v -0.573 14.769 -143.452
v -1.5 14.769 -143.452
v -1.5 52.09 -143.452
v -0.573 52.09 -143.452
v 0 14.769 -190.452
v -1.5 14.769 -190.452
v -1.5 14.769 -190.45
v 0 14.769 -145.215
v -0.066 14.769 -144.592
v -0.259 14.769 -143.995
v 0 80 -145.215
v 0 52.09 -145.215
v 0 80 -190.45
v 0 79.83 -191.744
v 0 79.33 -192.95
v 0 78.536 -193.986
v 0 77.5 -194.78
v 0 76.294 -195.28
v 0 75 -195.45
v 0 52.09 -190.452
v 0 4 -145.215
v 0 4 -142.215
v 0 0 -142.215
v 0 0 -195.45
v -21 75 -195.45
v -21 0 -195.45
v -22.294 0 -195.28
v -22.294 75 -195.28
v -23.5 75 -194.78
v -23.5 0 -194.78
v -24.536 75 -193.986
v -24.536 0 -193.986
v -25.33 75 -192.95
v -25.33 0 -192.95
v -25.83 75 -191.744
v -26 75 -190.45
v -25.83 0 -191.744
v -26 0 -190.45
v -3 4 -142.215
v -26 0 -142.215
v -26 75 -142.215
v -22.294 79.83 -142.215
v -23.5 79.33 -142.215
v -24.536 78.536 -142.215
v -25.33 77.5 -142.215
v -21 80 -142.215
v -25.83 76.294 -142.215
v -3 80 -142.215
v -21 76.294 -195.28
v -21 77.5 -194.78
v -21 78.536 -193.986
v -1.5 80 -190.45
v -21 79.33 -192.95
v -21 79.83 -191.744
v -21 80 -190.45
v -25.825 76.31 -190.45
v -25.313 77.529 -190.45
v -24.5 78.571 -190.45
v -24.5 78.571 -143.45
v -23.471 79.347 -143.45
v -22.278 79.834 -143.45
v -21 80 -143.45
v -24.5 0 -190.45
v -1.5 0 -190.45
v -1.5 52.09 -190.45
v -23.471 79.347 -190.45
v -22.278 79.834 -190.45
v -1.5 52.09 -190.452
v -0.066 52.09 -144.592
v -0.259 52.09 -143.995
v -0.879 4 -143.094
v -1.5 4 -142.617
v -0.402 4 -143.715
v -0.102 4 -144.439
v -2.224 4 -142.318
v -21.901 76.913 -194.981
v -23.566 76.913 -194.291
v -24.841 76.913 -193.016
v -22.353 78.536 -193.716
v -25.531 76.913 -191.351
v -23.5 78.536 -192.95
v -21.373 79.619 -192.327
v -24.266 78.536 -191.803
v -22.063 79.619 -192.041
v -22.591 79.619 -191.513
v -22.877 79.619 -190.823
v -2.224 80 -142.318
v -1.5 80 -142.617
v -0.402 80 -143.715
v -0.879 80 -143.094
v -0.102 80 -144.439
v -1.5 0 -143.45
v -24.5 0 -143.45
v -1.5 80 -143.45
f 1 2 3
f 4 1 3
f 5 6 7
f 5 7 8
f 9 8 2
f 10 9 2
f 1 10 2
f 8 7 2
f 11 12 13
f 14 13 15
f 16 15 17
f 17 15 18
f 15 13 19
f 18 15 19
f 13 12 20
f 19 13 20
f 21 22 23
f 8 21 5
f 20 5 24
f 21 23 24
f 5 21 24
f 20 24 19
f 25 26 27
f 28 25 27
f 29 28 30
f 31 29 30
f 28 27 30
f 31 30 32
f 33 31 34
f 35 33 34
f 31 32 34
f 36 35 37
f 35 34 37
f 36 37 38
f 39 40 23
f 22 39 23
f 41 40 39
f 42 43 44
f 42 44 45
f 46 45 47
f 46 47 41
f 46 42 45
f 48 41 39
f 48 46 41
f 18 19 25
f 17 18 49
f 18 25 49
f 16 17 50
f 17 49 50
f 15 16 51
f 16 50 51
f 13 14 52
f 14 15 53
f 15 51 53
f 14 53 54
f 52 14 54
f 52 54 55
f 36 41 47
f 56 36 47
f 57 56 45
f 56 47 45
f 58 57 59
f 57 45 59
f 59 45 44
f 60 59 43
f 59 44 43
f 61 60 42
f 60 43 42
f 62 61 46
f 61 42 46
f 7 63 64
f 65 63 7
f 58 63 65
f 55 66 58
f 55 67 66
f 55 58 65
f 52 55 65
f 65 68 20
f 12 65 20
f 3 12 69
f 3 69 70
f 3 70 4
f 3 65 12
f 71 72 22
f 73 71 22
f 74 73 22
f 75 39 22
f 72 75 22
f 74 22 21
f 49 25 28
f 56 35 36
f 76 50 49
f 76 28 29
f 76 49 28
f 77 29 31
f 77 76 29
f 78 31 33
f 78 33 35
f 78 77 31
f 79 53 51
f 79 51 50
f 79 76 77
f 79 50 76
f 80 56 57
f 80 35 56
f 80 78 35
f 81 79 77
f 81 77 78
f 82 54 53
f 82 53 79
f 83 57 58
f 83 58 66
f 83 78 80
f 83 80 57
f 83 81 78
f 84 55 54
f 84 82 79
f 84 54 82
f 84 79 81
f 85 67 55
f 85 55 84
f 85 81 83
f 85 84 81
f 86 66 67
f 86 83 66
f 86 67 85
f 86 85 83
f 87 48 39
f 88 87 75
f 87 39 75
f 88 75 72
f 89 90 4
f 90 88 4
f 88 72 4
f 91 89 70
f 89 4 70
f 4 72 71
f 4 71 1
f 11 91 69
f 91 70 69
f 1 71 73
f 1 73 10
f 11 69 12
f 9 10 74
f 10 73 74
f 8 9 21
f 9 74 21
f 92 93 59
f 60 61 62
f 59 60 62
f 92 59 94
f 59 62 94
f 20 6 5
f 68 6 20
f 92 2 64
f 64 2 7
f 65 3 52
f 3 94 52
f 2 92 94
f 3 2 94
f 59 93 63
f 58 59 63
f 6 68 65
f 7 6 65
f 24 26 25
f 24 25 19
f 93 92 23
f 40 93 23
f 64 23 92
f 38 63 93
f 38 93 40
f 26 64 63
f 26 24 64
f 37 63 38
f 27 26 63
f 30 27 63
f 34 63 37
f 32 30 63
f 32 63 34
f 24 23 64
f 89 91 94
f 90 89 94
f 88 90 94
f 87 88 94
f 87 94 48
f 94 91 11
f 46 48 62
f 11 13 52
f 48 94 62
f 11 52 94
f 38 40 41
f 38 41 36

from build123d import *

# Parameters (mm, degrees)
BOSS_EXTRUDE1_DEPTH = 4
BOSS_EXTRUDE2_DEPTH = 80
SKETCH3_R           = 8.5
CUT_EXTRUDE1_DEPTH  = 171
SKETCH4_W           = 68
SKETCH4_H           = 18.002499925
CUT_EXTRUDE2_DEPTH  = 116
SKETCH5_W           = 23
SKETCH5_H           = 47
CUT_EXTRUDE3_DEPTH  = 110.266506281
SKETCH8_W           = 47
SKETCH8_H           = 37.321718457
CUT_EXTRUDE6_DEPTH  = 3.266506281
FILLET2_R           = 5
FILLET3_R           = 5
FILLET4_R           = 5
SKETCH9_W           = 106
SKETCH9_H           = 50.845410363
CUT_EXTRUDE7_DEPTH  = 92
FILLET16_R          = 10
FILLET18_R          = 3
CUT_EXTRUDE9_DEPTH  = 90


with BuildPart() as part:
    # Sketch1 → Boss-Extrude1 (new body)
    with BuildSketch(Plane(origin=(0, 0, 0), x_dir=(1, 0, 0), z_dir=(0, 1, 0))):
        Polygon((0, 152), (0, 101.37), (75, 101.37), (75, 191.351980657), (75, 192.37), (0, 192.37), align=None)
    extrude(amount=BOSS_EXTRUDE1_DEPTH)

    # Sketch2 → Boss-Extrude2 (add)
    with BuildSketch(Plane(origin=(0, 0, 0), x_dir=(-1, 0, 0), z_dir=(0, -1, 0))):
        Polygon((26, 91.37), (26, 176.99818396), (26, 195.45), (-80, 195.45), (-80, 176.99818396), (-80, 91.37), align=None)
        Polygon((-75, 192), (-75, 192.37), (0, 192.37), (0, 101.37), (-75, 101.37), align=None, mode=Mode.SUBTRACT)
    extrude(amount=-BOSS_EXTRUDE2_DEPTH)

    # Sketch3 → Cut-Extrude1 (cut)
    with BuildSketch(Plane.XY.offset(18)):
        with Locations((34.765402097, 21.5)):
            Circle(SKETCH3_R)
    extrude(amount=-CUT_EXTRUDE1_DEPTH, mode=Mode.SUBTRACT)

    # Sketch4 → Cut-Extrude2 (cut)
    with BuildSketch(Plane(origin=(0, 4, 0), x_dir=(1, 0, 0), z_dir=(0, 1, 0))):
        with Locations((34.5, 183.368750038)):
            Rectangle(SKETCH4_W, SKETCH4_H)
    extrude(amount=-CUT_EXTRUDE2_DEPTH, mode=Mode.SUBTRACT)

    # Sketch5 → Cut-Extrude3 (cut)
    with BuildSketch(Plane(origin=(0, 80, 0), x_dir=(1, 0, 0), z_dir=(0, 1, 0))):
        with Locations((-13, 166.95)):
            Rectangle(SKETCH5_W, SKETCH5_H)
    extrude(amount=-CUT_EXTRUDE3_DEPTH, mode=Mode.SUBTRACT)

    # Sketch8 → Cut-Extrude6 (cut)
    with BuildSketch(Plane.ZY.offset(1.5)):
        with Locations((-166.95181604, 33.429515658)):
            Rectangle(SKETCH8_W, SKETCH8_H)
    extrude(amount=-CUT_EXTRUDE6_DEPTH, mode=Mode.SUBTRACT)

    # Fillet2
    # the kernel refuses this fillet: 5 mm, written as the material it takes off along each edge
    with BuildSketch(Plane(origin=(-21, 75, -190.45), x_dir=(0, 0, -1), z_dir=(0, 1, 0))) as fillet2_piece_1_section:
        Polygon((0, 0), (FILLET2_R, 0), (FILLET2_R, FILLET2_R), (0, FILLET2_R), align=None)
    fillet2_piece_1 = extrude(amount=FILLET2_R, mode=Mode.PRIVATE)
    fillet2_piece_1 = fillet2_piece_1 - Plane(origin=(-21, 75, -190.45), x_dir=(0.7071067811865475, 0, 0.7071067811865475), z_dir=(0, 1, 0)) * Sphere(FILLET2_R, mode=Mode.PRIVATE)
    add(fillet2_piece_1, mode=Mode.SUBTRACT)
    with BuildSketch(Plane(origin=(80, -12.5, -91.37), x_dir=(-1, 0, 0), z_dir=(0, 1, 0))) as fillet2_piece_2:
        with BuildLine():
            CenterArc((FILLET2_R, -FILLET2_R), FILLET2_R, 90, 90)
            Line((0, -FILLET2_R), (0, 0))
            Line((0, 0), (FILLET2_R, 0))
        make_face()
    extrude(amount=105, mode=Mode.SUBTRACT)
    with BuildSketch(Plane(origin=(92.5, 80, -91.37), x_dir=(0, 0, -1), z_dir=(-1, 0, 0))) as fillet2_piece_3:
        with BuildLine():
            CenterArc((FILLET2_R, FILLET2_R), FILLET2_R, 180, 90)
            Line((0, FILLET2_R), (0, 0))
            Line((0, 0), (FILLET2_R, 0))
        make_face()
    extrude(amount=131, mode=Mode.SUBTRACT)
    with BuildSketch(Plane(origin=(-26, -12.5, -195.45), x_dir=(0, 0, 1), z_dir=(0, 1, 0))) as fillet2_piece_4:
        with BuildLine():
            CenterArc((FILLET2_R, FILLET2_R), FILLET2_R, 180, 90)
            Line((0, FILLET2_R), (0, 0))
            Line((0, 0), (FILLET2_R, 0))
        make_face()
    extrude(amount=87.5, mode=Mode.SUBTRACT)
    with BuildSketch(Plane(origin=(-26, 80, -78.87), x_dir=(1, 0, 0), z_dir=(0, 0, -1))) as fillet2_piece_5:
        with BuildLine():
            CenterArc((FILLET2_R, FILLET2_R), FILLET2_R, 180, 90)
            Line((0, FILLET2_R), (0, 0))
            Line((0, 0), (FILLET2_R, 0))
        make_face()
    extrude(amount=111.58, mode=Mode.SUBTRACT)
    with BuildSketch(Plane(origin=(80, -12.5, -195.45), x_dir=(-1, 0, 0), z_dir=(0, 1, 0))) as fillet2_piece_6:
        with BuildLine():
            CenterArc((FILLET2_R, FILLET2_R), FILLET2_R, 180, 90)
            Line((0, FILLET2_R), (0, 0))
            Line((0, 0), (FILLET2_R, 0))
        make_face()
    extrude(amount=105, mode=Mode.SUBTRACT)
    with BuildSketch(Plane(origin=(-21, 80, -195.45), x_dir=(0, 0, 1), z_dir=(1, 0, 0))) as fillet2_piece_7:
        with BuildLine():
            CenterArc((FILLET2_R, FILLET2_R), FILLET2_R, 180, 90)
            Line((0, FILLET2_R), (0, 0))
            Line((0, 0), (FILLET2_R, 0))
        make_face()
    extrude(amount=113.5, mode=Mode.SUBTRACT)

    # Fillet3
    # the kernel refuses this fillet: 5 mm, written as the material it takes off along each edge
    with BuildSketch(Plane(origin=(-21, 75, -96.37), x_dir=(0, 0, 1), z_dir=(-1, 0, 0))) as fillet3_piece_1_section:
        Polygon((0, 0), (FILLET3_R, 0), (FILLET3_R, FILLET3_R), (0, FILLET3_R), align=None)
    fillet3_piece_1 = extrude(amount=FILLET3_R, mode=Mode.PRIVATE)
    fillet3_piece_1 = fillet3_piece_1 - Plane(origin=(-21, 75, -96.37), x_dir=(0, -0.7071067811865475, -0.7071067811865475), z_dir=(-1, 0, 0)) * Sphere(FILLET3_R, mode=Mode.PRIVATE)
    add(fillet3_piece_1, mode=Mode.SUBTRACT)
    with BuildSketch(Plane(origin=(-26, -12.5, -91.37), x_dir=(0, 0, -1), z_dir=(0, 1, 0))) as fillet3_piece_2:
        with BuildLine():
            CenterArc((FILLET3_R, -FILLET3_R), FILLET3_R, 90, 90)
            Line((0, -FILLET3_R), (0, 0))
            Line((0, 0), (FILLET3_R, 0))
        make_face()
    extrude(amount=87.5, mode=Mode.SUBTRACT)

    # Fillet4
    # the kernel refuses this fillet: 5 mm, written as the material it takes off along each edge
    with BuildSketch(Plane(origin=(75, 75, -190.45), x_dir=(1, 0, 0), z_dir=(0, 1, 0))) as fillet4_piece_1_section:
        Polygon((0, 0), (FILLET4_R, 0), (FILLET4_R, FILLET4_R), (0, FILLET4_R), align=None)
    fillet4_piece_1 = extrude(amount=FILLET4_R, mode=Mode.PRIVATE)
    fillet4_piece_1 = fillet4_piece_1 - Plane(origin=(75, 75, -190.45), x_dir=(-0.7071067811865475, 0, 0.7071067811865475), z_dir=(0, 1, 0)) * Sphere(FILLET4_R, mode=Mode.PRIVATE)
    add(fillet4_piece_1, mode=Mode.SUBTRACT)
    with BuildSketch(Plane(origin=(75, 75, -96.37), x_dir=(1, 0, 0), z_dir=(0, 1, 0))) as fillet4_piece_2_section:
        Polygon((0, 0), (FILLET4_R, 0), (FILLET4_R, -FILLET4_R), (0, -FILLET4_R), align=None)
    fillet4_piece_2 = extrude(amount=FILLET4_R, mode=Mode.PRIVATE)
    fillet4_piece_2 = fillet4_piece_2 - Plane(origin=(75, 75, -96.37), x_dir=(-0.7071067811865475, 0, -0.7071067811865475), z_dir=(0, 1, 0)) * Sphere(FILLET4_R, mode=Mode.PRIVATE)
    add(fillet4_piece_2, mode=Mode.SUBTRACT)
    with BuildSketch(Plane(origin=(80, 80, -190.45), x_dir=(-1, 0, 0), z_dir=(0, 0, 1))) as fillet4_piece_3:
        with BuildLine():
            CenterArc((FILLET4_R, FILLET4_R), FILLET4_R, 180, 90)
            Line((0, FILLET4_R), (0, 0))
            Line((0, 0), (FILLET4_R, 0))
        make_face()
    extrude(amount=94.08, mode=Mode.SUBTRACT)

    # Sketch9 → Cut-Extrude7 (cut)
    with BuildSketch(Plane(origin=(0, 80, 0), x_dir=(1, 0, 0), z_dir=(0, 1, 0))):
        with Locations((27, 116.792705182)):
            Rectangle(SKETCH9_W, SKETCH9_H)
    extrude(amount=-CUT_EXTRUDE7_DEPTH, mode=Mode.SUBTRACT)

    # Fillet16
    # the kernel refuses this fillet: 10 mm, written as the material it takes off along each edge
    with BuildSketch(Plane(origin=(75, 101.650635095, -142.215410363), x_dir=(0, 0, -1), z_dir=(0, -1, 0))) as fillet16_piece_1:
        with BuildLine():
            CenterArc((8.660254038, 10), FILLET16_R, 210, 60)
            Line((0, 5), (0, 0))
            Line((0, 0), (8.660254038, 0))
        make_face()
    extrude(amount=97.650635095, mode=Mode.SUBTRACT)

    # Fillet18
    # the kernel refuses this fillet: 3 mm, written as the material it takes off along each edge
    with BuildSketch(Plane(origin=(0, 4, -142.215410363), x_dir=(-1, 0, 0), z_dir=(0, 1, 0))) as fillet18_piece_1:
        with BuildLine():
            CenterArc((FILLET18_R, -FILLET18_R), FILLET18_R, 90, 90)
            Line((0, -FILLET18_R), (0, 0))
            Line((0, 0), (FILLET18_R, 0))
        make_face()
    extrude(amount=83.5, mode=Mode.SUBTRACT)

    # Sketch10 → Cut-Extrude9 (cut)
    with BuildSketch(Plane.XZ):
        Polygon((80, -190.45), (80, -142.215410363), (0, -142.215410363), (0, -195.45), (80, -195.45), align=None)
    extrude(amount=-CUT_EXTRUDE9_DEPTH, mode=Mode.SUBTRACT)


solid = part.part
